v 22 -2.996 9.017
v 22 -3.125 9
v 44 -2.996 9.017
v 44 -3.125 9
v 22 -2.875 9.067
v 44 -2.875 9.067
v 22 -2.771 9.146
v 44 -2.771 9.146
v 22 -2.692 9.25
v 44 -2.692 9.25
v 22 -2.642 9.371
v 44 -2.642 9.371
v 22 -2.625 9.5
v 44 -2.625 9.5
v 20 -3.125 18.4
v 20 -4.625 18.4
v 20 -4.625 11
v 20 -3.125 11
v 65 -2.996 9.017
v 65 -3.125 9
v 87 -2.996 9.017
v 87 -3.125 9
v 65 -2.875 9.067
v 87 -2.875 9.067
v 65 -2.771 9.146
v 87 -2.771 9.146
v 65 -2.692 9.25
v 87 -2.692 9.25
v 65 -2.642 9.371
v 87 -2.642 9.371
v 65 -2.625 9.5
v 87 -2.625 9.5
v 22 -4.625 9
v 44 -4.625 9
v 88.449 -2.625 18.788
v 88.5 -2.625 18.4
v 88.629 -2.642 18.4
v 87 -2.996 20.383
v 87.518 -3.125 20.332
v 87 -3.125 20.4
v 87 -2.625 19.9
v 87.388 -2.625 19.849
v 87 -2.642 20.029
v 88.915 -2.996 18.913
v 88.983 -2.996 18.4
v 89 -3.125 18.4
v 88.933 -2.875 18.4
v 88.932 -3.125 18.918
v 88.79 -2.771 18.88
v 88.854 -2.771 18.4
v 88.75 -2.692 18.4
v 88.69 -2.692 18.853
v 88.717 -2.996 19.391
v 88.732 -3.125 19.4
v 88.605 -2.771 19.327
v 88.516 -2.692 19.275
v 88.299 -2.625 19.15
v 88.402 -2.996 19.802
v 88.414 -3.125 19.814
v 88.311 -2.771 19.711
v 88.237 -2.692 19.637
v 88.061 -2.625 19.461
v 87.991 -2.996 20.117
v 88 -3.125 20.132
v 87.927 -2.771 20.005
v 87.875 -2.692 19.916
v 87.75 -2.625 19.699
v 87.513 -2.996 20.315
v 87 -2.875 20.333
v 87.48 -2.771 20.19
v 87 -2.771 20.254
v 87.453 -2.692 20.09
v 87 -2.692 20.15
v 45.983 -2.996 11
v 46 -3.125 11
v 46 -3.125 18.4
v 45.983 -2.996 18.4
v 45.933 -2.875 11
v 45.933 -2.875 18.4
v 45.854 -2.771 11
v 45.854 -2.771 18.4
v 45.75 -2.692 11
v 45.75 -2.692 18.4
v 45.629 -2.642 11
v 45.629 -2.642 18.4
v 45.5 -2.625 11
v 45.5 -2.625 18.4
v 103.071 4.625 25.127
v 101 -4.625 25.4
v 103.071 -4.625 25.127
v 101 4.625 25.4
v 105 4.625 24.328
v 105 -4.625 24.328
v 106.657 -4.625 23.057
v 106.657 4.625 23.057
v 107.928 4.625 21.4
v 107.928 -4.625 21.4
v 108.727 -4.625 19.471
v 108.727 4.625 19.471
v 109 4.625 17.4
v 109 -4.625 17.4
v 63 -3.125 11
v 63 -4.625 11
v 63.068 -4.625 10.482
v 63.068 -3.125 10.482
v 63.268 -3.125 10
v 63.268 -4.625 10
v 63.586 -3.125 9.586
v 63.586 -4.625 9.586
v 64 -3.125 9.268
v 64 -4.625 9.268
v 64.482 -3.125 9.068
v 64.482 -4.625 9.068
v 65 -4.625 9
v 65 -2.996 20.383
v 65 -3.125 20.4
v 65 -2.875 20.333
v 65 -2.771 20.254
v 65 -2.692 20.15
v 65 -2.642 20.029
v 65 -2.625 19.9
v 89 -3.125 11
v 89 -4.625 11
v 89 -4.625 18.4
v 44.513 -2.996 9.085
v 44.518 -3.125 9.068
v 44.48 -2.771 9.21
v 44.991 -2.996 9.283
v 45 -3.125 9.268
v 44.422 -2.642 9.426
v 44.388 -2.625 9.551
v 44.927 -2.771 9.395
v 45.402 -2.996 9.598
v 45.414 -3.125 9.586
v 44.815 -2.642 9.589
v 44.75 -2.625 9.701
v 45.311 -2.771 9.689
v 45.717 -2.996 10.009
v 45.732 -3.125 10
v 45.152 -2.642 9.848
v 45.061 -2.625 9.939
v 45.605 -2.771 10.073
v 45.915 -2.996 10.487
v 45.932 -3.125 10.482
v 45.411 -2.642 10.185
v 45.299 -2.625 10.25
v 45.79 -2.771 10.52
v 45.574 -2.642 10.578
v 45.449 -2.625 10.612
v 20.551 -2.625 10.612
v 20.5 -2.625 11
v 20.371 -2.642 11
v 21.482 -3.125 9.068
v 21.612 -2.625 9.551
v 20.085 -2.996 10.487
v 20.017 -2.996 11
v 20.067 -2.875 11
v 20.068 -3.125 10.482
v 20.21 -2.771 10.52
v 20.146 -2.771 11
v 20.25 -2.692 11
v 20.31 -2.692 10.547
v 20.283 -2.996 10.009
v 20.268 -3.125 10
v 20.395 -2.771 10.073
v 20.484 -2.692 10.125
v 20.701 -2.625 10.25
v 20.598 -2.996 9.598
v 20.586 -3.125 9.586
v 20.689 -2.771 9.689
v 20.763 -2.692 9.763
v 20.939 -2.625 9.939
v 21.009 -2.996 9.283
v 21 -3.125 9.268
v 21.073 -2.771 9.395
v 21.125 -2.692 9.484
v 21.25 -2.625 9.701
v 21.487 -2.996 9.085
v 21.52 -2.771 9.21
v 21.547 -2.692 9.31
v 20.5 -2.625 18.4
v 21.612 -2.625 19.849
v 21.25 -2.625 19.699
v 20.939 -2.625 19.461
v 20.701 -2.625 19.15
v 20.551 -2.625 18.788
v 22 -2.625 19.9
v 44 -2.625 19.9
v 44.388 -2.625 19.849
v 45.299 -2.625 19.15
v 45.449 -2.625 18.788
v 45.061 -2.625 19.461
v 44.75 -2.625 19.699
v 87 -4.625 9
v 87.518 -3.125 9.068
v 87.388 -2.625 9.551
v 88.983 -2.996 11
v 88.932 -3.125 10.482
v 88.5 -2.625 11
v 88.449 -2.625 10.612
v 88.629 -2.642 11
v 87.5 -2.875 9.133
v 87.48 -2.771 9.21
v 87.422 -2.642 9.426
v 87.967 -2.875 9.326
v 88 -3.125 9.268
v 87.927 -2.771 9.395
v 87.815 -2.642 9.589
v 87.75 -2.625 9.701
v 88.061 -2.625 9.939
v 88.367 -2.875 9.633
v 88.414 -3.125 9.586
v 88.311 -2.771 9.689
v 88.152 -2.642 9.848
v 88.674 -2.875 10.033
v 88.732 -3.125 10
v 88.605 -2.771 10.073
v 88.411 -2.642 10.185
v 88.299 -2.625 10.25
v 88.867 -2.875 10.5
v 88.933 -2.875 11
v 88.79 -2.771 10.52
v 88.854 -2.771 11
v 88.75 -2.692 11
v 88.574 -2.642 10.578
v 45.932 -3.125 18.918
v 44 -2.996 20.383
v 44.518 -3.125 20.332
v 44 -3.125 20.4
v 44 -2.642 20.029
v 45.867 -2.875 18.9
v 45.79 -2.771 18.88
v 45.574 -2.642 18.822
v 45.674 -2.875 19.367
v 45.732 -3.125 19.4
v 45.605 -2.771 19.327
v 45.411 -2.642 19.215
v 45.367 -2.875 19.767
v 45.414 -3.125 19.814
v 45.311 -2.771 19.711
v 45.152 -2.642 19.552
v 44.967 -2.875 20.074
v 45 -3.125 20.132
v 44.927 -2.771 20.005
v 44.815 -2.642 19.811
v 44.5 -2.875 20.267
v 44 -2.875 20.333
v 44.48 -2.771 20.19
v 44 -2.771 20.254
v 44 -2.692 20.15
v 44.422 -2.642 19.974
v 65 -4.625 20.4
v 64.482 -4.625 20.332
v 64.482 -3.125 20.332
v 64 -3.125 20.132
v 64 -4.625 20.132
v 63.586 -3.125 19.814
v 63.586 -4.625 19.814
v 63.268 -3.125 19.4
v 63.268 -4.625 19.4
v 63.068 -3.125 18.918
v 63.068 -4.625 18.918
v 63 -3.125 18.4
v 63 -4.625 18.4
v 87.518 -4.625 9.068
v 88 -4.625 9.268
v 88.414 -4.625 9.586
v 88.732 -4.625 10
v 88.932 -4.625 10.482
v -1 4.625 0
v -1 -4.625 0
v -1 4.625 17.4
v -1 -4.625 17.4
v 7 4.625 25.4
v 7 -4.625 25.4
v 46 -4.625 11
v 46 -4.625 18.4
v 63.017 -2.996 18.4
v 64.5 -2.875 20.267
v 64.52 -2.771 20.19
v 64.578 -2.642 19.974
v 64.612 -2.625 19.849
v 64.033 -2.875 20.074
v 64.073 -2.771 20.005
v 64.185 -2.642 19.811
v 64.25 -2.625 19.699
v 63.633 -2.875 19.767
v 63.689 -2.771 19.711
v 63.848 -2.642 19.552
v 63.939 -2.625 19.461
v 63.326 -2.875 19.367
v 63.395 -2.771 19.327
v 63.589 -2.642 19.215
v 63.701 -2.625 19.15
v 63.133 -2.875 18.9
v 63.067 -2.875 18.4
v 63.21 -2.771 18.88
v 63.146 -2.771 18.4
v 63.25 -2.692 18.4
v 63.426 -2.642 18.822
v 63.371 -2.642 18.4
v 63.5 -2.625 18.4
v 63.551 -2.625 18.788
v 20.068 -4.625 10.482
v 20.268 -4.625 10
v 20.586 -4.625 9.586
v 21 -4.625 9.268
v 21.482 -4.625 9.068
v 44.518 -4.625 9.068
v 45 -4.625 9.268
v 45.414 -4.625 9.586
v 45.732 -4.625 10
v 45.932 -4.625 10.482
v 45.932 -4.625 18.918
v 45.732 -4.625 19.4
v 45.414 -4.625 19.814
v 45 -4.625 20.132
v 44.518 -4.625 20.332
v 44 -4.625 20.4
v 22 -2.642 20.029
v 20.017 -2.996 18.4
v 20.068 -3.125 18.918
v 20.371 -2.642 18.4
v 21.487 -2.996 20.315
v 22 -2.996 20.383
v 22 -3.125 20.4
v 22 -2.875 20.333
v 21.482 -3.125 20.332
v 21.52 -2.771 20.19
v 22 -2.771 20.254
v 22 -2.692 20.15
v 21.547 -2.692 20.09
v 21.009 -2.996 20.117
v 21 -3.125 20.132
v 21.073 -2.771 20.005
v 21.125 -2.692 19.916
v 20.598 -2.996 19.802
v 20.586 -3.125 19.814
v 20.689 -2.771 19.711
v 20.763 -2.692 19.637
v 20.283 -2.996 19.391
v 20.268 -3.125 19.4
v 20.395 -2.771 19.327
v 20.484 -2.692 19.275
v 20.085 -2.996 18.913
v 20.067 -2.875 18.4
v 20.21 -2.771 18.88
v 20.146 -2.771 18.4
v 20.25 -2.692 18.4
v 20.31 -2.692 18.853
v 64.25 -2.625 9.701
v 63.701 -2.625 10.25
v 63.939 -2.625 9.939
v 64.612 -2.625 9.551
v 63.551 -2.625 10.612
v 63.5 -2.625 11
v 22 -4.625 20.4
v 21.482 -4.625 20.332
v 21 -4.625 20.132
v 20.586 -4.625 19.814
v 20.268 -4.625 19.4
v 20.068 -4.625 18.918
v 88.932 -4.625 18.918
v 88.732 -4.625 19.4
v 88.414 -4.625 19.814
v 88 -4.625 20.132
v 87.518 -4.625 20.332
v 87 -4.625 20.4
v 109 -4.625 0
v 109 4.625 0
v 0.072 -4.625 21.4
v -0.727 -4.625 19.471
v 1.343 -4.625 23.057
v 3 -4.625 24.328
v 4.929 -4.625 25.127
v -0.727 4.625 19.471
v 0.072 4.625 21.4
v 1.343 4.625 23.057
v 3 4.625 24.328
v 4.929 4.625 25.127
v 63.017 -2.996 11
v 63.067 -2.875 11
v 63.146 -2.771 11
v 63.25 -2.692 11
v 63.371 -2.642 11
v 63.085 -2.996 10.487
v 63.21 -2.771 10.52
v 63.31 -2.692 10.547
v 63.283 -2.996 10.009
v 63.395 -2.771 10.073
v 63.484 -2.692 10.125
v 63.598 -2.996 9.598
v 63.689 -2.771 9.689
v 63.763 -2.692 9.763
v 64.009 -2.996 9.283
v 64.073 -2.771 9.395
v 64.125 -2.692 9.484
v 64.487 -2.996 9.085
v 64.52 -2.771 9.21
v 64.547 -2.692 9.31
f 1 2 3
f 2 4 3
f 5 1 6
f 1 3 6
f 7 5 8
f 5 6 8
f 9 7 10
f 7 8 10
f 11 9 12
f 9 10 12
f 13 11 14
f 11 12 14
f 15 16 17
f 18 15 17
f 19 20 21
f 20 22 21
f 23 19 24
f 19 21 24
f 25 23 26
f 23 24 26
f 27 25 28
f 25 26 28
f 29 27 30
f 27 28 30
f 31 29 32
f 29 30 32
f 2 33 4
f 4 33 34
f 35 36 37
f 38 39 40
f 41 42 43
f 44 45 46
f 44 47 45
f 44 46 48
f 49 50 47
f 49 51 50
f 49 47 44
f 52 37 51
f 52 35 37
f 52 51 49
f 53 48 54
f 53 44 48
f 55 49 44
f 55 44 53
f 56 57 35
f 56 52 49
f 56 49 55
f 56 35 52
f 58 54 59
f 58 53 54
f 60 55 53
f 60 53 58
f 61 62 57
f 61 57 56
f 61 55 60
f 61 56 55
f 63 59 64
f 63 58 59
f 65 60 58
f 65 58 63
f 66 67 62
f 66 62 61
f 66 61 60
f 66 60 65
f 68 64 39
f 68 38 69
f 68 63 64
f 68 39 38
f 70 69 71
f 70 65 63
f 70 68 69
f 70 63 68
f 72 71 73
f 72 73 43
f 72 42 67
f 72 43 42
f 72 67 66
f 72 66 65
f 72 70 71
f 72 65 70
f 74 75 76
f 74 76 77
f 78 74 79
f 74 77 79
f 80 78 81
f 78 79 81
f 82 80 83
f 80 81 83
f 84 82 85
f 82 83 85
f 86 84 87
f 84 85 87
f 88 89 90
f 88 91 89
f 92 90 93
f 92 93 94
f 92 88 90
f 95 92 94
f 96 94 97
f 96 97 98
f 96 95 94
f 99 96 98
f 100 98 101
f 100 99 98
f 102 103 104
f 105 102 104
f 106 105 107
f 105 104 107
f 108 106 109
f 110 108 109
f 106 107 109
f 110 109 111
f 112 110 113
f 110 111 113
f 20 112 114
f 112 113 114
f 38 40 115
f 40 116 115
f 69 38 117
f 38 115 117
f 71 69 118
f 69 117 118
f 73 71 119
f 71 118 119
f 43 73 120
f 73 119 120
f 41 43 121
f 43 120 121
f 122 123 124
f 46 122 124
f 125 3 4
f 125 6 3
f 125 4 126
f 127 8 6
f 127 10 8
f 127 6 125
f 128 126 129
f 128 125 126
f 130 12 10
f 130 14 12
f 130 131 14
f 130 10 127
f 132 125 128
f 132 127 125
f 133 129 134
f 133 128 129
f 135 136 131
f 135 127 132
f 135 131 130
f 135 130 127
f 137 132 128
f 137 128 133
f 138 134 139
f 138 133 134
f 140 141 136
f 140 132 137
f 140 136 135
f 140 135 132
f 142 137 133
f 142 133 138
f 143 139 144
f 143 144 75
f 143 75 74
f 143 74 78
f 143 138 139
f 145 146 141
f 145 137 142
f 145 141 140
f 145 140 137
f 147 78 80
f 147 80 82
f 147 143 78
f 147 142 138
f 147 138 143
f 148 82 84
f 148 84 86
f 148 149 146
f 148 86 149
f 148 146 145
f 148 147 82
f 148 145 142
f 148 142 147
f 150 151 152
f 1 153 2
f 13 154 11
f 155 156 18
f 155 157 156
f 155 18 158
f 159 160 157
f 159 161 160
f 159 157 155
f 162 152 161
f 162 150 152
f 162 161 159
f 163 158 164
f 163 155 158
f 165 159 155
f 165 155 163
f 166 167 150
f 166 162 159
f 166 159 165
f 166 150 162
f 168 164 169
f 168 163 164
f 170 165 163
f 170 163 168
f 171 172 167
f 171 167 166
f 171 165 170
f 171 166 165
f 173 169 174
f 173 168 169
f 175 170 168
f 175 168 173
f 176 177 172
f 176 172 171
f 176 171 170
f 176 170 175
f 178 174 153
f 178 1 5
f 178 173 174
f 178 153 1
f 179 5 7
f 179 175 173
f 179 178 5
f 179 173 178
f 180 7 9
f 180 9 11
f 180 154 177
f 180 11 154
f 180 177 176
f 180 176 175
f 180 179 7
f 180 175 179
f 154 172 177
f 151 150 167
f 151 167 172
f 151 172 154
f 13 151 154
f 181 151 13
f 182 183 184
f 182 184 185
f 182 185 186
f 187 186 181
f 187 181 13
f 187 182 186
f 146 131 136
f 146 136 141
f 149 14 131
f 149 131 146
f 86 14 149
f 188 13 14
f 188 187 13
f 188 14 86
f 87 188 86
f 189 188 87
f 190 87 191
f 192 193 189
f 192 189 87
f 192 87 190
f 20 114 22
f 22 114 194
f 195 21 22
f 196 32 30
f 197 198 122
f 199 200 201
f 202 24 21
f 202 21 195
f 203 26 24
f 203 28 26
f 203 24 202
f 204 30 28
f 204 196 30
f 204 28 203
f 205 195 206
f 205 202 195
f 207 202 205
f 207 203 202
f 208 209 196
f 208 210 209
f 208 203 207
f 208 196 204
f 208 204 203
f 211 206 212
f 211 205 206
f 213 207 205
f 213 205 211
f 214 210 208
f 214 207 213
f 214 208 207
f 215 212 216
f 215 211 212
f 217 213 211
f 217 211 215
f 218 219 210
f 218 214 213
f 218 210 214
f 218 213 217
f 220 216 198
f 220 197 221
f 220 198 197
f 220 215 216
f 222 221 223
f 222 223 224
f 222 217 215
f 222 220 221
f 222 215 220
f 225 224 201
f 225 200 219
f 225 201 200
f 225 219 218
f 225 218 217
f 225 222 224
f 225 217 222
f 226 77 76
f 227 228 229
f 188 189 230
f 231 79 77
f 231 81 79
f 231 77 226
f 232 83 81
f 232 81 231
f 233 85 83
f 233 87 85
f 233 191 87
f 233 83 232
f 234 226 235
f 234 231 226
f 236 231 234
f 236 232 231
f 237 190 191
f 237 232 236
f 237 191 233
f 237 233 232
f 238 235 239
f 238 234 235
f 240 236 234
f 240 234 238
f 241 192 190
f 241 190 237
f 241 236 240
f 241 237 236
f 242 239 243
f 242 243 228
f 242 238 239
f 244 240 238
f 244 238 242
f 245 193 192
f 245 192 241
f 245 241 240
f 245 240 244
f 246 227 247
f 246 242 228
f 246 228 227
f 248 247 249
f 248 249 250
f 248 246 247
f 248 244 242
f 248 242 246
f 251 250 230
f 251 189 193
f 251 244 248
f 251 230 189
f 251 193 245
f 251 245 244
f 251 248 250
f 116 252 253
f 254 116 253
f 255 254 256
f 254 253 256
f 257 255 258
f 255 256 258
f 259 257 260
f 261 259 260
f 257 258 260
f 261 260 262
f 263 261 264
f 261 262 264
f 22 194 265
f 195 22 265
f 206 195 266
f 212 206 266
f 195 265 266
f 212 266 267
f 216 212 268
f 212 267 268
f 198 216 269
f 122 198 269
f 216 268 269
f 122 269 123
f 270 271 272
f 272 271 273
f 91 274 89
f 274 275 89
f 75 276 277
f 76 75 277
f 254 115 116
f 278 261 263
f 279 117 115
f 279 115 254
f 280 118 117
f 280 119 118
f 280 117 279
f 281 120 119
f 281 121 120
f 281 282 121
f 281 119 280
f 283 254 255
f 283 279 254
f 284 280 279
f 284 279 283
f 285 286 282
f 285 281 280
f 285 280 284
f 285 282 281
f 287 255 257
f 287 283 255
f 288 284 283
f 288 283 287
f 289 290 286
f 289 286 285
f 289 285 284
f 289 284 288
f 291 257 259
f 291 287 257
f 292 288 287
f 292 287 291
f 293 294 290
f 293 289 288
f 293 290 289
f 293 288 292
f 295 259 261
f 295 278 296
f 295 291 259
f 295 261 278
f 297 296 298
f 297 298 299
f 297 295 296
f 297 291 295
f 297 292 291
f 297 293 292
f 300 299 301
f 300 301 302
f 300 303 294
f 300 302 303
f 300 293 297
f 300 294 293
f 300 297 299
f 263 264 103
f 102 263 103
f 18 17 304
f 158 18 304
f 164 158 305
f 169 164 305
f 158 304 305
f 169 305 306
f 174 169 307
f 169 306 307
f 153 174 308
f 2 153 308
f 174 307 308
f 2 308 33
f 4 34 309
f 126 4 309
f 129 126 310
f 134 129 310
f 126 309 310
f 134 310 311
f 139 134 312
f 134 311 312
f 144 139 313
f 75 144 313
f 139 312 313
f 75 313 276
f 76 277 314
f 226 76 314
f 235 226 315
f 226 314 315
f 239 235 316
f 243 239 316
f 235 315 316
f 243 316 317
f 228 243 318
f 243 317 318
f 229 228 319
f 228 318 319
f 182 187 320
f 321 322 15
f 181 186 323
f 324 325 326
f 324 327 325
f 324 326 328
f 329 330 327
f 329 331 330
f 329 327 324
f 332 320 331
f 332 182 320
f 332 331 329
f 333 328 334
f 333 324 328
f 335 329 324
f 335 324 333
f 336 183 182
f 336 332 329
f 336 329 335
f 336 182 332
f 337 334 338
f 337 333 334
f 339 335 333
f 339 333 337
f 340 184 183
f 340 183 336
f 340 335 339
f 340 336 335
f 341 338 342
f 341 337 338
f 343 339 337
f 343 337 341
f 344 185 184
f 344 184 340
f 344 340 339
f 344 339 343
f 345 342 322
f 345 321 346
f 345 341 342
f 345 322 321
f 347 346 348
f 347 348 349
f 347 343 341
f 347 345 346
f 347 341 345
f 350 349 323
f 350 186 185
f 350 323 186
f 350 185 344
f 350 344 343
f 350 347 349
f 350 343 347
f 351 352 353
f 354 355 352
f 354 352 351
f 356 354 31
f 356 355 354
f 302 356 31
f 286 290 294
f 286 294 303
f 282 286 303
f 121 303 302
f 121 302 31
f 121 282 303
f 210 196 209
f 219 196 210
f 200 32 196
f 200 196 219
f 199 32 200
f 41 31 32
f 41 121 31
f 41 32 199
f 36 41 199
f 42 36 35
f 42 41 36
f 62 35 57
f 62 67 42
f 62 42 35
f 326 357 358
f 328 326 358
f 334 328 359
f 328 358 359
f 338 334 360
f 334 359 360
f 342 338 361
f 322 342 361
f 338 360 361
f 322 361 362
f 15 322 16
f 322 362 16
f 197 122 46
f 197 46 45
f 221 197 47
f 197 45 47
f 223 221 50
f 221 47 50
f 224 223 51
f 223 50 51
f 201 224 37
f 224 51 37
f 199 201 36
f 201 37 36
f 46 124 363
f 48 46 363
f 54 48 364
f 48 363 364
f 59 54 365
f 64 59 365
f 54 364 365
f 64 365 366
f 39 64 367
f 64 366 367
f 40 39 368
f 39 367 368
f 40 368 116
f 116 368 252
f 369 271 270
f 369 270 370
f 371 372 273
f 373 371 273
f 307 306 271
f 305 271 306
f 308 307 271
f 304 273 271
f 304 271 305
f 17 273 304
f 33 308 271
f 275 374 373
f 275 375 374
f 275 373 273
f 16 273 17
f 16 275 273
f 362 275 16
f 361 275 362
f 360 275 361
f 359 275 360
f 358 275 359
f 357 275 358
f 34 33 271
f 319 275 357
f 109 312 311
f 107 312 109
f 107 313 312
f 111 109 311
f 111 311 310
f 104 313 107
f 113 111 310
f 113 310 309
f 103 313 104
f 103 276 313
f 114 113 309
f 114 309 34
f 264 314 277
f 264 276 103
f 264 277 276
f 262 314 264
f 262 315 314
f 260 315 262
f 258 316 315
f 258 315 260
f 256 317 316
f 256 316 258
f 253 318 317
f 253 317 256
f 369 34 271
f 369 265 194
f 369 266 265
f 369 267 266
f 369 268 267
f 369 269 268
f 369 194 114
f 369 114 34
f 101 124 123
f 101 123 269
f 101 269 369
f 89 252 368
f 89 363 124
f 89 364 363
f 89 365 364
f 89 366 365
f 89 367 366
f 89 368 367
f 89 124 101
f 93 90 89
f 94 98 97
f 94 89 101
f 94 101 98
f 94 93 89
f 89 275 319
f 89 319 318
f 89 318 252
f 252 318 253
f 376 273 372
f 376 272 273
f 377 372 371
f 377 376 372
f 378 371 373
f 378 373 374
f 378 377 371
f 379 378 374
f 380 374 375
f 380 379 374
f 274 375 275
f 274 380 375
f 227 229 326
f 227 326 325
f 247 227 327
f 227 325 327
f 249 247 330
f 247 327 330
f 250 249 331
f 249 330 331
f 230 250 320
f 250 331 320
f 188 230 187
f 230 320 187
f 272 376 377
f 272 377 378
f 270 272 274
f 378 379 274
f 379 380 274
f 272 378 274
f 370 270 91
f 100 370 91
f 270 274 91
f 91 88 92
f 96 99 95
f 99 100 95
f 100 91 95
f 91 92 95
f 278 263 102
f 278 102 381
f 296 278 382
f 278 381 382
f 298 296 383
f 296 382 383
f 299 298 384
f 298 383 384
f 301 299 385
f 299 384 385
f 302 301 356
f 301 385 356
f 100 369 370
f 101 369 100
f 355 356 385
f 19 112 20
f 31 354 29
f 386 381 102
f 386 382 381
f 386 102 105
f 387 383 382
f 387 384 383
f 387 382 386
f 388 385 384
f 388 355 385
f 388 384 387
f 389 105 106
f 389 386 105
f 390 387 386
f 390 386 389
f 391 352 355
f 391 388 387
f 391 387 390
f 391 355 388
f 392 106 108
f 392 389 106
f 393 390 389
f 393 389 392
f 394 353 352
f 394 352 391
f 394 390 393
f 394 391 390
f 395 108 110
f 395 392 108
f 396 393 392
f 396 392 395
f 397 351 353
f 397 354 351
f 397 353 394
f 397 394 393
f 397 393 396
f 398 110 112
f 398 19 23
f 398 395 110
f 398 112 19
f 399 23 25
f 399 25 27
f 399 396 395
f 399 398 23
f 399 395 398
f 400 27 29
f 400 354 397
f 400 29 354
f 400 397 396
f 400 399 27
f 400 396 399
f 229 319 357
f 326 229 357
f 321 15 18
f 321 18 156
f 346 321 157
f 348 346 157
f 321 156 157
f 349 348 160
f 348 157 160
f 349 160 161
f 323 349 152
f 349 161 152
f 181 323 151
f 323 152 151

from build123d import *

# Parameters (mm, degrees)
F0_W     = 110
F0_H     = 25.4
F1_DEPTH = 4.625
F3_DEPTH = 2
F4_R     = 0.5
F5_R     = 8


with BuildPart() as f1:
    # F0 (on Front) → F1 (new body, symmetric)
    with BuildSketch(Plane.XZ):
        with Locations((54, 12.7)):
            Rectangle(F0_W, F0_H)
    extrude(amount=F1_DEPTH, both=True)

    # F2 (on face) → F3 (cut)
    with BuildSketch(Plane.XZ.offset(4.625)):
        with BuildLine():
            ThreePointArc((20, 11), (20.585786, 9.585786), (22, 9))
            Line((22, 9), (44, 9))
            ThreePointArc((44, 9), (45.414214, 9.585786), (46, 11))
            Line((46, 11), (46, 18.4))
            ThreePointArc((46, 18.4), (45.414214, 19.814214), (44, 20.4))
            Line((44, 20.4), (22, 20.4))
            ThreePointArc((22, 20.4), (20.585786, 19.814214), (20, 18.4))
            Line((20, 18.4), (20, 11))
        make_face()
        with BuildLine():
            Line((87, 20.4), (65, 20.4))
            ThreePointArc((65, 20.4), (63.585786, 19.814214), (63, 18.4))
            Line((63, 18.4), (63, 11))
            ThreePointArc((63, 11), (63.585786, 9.585786), (65, 9))
            Line((65, 9), (87, 9))
            ThreePointArc((87, 9), (88.414214, 9.585786), (89, 11))
            Line((89, 11), (89, 18.4))
            ThreePointArc((89, 18.4), (88.414214, 19.814214), (87, 20.4))
        make_face()
    extrude(amount=-F3_DEPTH, mode=Mode.SUBTRACT)

    # F4
    f4_edges = [f1.edges().sort_by_distance(p)[0] for p in [
        (89, -2.625, 14.7),
        (46, -2.625, 14.7),
    ]]
    fillet(f4_edges, radius=F4_R)

    # F5
    f5_edges = [f1.edges().sort_by_distance(p)[0] for p in [
        (109, 0, 25.4),
        (-1, 0, 25.4),
    ]]
    fillet(f5_edges, radius=F5_R)


solid = f1.part
